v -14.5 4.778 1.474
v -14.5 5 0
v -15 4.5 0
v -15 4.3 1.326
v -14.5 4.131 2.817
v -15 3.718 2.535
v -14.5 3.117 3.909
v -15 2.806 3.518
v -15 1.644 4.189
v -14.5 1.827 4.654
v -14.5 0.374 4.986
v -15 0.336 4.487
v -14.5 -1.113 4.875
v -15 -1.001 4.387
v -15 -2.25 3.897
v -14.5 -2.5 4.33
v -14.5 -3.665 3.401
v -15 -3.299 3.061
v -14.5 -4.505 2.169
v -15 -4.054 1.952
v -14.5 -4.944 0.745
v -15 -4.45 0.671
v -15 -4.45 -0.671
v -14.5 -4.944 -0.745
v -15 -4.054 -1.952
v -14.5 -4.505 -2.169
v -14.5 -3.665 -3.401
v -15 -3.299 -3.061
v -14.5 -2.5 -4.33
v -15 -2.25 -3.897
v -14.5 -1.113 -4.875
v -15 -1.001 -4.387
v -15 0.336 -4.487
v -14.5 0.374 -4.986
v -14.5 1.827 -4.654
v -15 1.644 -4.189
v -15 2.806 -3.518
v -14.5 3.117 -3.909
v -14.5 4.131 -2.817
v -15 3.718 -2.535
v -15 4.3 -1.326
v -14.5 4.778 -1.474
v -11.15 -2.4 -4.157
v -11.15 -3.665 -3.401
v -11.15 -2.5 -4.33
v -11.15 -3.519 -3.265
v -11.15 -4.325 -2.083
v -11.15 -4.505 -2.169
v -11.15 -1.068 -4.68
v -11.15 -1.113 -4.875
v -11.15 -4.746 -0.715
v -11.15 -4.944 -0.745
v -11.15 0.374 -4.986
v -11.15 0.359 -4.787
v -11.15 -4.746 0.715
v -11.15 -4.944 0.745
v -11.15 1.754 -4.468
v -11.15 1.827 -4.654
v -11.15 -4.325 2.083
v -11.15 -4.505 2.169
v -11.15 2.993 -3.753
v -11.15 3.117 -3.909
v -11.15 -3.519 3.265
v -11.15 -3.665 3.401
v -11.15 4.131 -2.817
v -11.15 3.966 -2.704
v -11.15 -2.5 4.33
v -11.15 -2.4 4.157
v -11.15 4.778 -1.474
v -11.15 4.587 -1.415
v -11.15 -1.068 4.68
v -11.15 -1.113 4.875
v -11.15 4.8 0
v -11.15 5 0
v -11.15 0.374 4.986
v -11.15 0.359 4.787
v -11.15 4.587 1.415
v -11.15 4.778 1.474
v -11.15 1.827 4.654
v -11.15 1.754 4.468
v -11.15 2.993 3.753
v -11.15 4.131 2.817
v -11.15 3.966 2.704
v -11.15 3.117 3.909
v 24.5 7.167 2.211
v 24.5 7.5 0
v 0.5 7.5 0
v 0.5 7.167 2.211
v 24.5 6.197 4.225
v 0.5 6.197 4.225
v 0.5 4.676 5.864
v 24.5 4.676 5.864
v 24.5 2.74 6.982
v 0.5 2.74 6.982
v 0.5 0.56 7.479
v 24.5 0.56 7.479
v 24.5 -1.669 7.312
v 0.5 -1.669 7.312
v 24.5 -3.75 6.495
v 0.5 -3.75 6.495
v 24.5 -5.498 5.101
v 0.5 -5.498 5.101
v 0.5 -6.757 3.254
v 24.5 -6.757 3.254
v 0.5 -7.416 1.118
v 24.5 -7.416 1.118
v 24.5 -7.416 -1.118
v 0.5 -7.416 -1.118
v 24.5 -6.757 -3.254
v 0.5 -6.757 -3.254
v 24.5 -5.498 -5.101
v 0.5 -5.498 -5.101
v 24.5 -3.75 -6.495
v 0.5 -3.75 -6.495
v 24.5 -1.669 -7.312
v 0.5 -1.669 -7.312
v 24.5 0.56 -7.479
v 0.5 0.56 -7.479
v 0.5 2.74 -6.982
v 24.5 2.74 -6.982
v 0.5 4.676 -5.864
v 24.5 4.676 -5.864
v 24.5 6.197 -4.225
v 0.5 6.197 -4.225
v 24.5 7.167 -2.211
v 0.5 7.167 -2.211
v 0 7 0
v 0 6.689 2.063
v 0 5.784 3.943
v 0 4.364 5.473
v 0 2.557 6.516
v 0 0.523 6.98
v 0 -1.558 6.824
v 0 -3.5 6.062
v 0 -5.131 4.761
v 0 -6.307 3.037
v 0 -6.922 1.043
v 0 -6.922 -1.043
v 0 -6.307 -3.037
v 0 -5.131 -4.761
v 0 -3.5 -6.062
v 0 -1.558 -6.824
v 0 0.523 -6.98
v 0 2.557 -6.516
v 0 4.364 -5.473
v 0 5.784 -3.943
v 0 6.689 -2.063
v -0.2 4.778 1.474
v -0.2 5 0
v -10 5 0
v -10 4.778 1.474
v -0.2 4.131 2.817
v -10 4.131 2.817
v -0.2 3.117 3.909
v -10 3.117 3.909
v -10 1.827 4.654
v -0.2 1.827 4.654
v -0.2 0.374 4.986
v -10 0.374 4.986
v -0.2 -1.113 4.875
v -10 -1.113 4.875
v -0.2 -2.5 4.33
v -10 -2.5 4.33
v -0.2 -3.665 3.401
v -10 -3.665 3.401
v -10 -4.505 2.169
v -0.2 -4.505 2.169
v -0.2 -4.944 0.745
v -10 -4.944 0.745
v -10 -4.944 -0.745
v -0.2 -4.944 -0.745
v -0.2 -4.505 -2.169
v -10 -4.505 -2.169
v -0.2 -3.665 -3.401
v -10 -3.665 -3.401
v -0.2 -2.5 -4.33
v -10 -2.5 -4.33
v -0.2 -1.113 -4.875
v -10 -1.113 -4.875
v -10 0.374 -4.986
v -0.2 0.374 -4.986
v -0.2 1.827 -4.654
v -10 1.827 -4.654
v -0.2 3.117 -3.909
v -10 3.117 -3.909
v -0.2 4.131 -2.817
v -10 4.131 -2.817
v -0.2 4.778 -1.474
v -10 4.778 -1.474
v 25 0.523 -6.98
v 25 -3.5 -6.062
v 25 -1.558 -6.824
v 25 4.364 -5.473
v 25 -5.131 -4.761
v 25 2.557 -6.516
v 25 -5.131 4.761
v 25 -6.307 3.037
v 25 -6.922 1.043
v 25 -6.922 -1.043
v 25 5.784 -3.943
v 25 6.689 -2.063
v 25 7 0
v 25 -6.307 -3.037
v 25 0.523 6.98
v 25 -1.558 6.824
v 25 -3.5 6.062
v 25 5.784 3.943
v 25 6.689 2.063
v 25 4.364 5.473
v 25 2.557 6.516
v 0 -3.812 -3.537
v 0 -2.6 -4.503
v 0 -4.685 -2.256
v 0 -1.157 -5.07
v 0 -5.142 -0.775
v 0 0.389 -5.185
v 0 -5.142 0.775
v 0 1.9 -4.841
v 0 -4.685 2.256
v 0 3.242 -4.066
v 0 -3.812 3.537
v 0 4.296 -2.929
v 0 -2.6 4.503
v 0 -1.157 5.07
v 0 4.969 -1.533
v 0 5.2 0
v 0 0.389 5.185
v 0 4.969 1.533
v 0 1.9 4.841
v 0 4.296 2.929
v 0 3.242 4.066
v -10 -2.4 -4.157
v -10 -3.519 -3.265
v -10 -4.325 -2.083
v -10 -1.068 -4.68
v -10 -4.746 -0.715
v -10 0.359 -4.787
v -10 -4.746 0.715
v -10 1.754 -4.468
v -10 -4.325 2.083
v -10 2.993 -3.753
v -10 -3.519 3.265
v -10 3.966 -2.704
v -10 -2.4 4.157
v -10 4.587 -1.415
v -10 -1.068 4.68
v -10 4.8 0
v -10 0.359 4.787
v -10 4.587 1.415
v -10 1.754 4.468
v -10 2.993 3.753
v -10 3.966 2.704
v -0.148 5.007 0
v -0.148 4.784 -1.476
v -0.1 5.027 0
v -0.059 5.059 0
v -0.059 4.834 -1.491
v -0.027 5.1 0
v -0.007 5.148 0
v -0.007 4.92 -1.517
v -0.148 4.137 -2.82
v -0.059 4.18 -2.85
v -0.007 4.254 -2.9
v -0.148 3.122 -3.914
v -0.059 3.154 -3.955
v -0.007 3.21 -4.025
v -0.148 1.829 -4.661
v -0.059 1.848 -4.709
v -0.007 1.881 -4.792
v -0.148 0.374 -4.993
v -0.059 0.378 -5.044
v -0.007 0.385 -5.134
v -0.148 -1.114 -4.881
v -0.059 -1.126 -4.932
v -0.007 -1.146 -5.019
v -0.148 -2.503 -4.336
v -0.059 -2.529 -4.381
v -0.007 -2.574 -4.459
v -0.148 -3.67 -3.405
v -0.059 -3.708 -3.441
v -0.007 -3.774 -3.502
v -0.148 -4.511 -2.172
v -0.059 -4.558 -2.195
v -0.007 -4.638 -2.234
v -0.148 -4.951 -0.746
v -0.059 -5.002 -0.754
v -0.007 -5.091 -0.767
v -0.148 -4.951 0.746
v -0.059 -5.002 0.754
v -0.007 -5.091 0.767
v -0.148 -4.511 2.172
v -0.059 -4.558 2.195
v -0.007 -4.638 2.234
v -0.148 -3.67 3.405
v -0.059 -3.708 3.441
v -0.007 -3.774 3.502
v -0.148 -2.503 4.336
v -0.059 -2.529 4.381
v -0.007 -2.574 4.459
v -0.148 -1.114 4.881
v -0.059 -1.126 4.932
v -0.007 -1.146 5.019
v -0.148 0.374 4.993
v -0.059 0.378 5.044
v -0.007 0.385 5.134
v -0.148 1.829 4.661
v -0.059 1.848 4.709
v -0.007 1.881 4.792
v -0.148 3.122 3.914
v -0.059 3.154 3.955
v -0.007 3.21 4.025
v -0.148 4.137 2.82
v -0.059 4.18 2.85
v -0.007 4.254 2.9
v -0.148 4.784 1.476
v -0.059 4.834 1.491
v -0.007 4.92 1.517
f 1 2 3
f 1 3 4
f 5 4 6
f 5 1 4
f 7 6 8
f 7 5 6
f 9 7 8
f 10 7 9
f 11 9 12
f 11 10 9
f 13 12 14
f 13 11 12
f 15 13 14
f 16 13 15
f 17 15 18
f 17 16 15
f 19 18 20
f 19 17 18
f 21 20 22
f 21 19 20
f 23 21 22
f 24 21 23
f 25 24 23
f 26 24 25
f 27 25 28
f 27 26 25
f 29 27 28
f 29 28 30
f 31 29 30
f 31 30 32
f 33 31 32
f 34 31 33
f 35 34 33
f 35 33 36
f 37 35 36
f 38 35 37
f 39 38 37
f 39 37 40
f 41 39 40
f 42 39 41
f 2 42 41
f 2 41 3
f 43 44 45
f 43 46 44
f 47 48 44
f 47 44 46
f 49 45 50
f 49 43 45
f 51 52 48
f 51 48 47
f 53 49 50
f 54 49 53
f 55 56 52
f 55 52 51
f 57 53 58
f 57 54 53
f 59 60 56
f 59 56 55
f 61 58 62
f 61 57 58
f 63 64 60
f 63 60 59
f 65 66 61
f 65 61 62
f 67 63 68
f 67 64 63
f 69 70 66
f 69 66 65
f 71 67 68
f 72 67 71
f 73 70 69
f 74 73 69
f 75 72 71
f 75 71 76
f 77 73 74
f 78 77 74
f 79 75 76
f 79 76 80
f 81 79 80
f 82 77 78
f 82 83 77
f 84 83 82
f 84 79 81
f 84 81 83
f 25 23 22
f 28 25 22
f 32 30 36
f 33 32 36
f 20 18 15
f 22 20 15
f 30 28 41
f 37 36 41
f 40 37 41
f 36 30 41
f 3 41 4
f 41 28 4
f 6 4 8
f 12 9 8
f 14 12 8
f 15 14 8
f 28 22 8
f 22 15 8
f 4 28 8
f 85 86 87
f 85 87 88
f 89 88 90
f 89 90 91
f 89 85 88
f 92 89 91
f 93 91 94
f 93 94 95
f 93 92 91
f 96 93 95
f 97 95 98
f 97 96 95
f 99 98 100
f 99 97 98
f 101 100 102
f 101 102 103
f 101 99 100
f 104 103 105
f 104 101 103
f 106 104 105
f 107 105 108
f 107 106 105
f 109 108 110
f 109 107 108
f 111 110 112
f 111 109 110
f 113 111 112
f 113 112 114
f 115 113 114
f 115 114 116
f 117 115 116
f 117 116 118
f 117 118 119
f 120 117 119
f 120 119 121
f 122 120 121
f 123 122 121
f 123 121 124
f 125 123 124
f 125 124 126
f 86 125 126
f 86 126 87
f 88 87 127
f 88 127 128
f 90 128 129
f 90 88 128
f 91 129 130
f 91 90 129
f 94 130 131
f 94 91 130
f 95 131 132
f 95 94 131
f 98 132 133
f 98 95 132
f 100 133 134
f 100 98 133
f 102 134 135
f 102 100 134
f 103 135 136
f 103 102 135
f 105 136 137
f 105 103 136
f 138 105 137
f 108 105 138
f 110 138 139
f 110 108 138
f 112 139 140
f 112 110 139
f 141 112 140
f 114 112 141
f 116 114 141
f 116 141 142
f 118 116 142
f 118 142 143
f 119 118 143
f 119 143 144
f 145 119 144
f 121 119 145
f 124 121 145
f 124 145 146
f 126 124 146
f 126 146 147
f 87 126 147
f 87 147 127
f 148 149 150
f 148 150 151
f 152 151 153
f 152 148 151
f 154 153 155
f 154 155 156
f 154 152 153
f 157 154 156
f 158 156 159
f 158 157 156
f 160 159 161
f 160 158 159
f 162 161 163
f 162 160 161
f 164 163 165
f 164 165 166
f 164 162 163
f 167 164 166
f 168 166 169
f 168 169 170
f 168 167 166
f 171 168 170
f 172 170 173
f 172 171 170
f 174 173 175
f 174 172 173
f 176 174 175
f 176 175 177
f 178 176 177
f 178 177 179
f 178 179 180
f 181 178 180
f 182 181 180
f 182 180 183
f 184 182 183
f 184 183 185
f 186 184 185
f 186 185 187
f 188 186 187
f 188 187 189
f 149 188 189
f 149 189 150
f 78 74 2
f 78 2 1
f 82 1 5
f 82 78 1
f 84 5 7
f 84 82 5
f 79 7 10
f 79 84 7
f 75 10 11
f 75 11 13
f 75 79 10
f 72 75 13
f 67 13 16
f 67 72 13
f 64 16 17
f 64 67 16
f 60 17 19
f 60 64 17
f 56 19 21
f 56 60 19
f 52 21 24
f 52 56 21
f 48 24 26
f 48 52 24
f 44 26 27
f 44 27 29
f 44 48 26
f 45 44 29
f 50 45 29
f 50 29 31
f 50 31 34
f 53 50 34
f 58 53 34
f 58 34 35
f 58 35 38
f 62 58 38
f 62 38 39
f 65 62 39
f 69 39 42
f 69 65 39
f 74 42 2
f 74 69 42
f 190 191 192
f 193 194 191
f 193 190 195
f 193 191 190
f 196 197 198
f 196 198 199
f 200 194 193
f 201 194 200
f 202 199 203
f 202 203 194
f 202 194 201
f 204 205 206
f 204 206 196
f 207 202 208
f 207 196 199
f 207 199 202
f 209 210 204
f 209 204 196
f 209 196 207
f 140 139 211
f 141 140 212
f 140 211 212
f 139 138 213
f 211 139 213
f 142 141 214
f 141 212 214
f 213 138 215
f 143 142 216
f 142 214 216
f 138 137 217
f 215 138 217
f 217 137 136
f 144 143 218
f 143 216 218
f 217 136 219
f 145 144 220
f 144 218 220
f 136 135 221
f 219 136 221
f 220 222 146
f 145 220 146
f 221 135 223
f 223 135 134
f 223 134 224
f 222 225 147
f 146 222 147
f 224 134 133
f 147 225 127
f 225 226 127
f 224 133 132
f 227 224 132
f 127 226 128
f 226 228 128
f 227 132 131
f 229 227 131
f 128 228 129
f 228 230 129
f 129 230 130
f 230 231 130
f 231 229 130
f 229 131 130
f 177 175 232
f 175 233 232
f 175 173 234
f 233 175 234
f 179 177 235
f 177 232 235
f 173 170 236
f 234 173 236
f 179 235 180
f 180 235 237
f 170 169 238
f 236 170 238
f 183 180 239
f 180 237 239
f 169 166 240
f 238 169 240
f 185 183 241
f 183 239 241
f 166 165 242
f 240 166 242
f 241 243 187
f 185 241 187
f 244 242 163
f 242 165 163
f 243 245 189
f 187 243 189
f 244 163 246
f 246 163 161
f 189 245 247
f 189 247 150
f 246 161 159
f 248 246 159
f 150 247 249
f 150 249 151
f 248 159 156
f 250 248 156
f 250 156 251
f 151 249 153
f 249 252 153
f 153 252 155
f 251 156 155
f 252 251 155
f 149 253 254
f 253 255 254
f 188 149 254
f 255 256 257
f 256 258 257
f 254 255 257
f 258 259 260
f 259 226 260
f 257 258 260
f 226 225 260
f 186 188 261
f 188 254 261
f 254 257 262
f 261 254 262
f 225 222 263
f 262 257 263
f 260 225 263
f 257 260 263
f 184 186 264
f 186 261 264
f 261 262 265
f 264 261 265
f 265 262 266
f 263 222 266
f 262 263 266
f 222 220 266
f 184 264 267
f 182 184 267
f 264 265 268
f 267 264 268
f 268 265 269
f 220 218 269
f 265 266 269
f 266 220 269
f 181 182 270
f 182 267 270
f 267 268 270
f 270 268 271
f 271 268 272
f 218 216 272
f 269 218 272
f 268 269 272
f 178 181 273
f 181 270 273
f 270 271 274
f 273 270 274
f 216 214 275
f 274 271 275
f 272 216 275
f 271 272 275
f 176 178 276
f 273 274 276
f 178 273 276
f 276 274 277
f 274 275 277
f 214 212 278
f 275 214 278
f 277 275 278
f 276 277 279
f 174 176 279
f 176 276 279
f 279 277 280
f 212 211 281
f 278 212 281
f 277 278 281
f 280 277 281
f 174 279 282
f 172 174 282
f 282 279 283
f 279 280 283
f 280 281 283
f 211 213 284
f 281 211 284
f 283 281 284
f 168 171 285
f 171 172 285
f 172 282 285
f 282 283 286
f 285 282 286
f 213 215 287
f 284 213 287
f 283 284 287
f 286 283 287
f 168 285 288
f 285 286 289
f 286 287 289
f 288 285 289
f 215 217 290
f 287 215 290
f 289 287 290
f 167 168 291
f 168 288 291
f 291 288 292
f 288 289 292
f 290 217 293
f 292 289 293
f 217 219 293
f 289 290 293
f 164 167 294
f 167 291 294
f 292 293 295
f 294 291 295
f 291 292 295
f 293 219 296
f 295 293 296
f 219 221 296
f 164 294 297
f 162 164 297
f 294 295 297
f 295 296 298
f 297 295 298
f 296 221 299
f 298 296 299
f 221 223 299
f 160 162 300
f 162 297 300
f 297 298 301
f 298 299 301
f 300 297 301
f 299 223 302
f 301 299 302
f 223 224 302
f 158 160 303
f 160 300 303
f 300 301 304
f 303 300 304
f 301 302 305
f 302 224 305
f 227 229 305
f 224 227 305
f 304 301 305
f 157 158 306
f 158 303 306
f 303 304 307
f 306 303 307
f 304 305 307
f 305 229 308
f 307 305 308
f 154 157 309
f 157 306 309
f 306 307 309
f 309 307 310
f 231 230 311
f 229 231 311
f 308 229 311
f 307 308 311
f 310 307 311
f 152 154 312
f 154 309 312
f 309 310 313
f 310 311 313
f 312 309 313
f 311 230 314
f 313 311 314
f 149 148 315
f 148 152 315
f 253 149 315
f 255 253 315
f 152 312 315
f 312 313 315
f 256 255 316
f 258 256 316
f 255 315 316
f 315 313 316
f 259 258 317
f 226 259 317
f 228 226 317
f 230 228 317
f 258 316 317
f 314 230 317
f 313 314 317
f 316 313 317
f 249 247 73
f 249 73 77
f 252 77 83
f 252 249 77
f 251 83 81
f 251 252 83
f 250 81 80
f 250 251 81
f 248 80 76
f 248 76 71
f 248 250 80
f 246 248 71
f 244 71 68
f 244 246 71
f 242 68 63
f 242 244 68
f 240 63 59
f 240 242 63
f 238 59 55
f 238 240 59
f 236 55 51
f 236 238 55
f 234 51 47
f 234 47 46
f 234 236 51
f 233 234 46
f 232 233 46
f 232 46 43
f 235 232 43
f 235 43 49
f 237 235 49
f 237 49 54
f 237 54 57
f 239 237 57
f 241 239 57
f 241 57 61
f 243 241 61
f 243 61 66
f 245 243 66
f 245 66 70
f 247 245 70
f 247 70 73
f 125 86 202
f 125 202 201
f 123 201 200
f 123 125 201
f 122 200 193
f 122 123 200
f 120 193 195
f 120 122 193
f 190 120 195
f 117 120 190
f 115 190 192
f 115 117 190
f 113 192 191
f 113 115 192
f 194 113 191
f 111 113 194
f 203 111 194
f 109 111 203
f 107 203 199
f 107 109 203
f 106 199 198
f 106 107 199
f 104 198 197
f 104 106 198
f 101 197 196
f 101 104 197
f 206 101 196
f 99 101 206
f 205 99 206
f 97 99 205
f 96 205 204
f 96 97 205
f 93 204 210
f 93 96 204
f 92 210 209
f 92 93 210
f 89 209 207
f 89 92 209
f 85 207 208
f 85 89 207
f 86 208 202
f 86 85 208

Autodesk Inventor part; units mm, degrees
ref_plane "YZ Plane" through (0, 0, 0) normal (1, 0, 0) x (0, 1, 0)
ref_plane "XZ Plane" through (0, 0, 0) normal (0, 1, 0) x (-1, 0, 0)
ref_plane "XY Plane" through (0, 0, 0) normal (0, 0, 1) x (1, 0, 0)
sketch "Sketch_1" plane through (0, 0, 0) normal (0, 0, 1) x (1, 0, 0)
  line L0 (25, 0) -> (-15, 0)
  line L1 (-15, 0) -> (-15, 4.5)
  line L2 (-15, 4.5) -> (-14.5, 5)
  line L3 (-14.5, 5) -> (-0.2, 5)
  arc A0 (-0.2, 5) -> (0, 5.2) centre (-0.2, 5.2) ccw
  line L4 (0, 5.2) -> (0, 7)
  line L5 (0, 7) -> (0.5, 7.5)
  line L6 (0.5, 7.5) -> (24.5, 7.5)
  line L7 (24.5, 7.5) -> (25, 7)
  line L8 (25, 7) -> (25, 0)
  line L9 (25, 0) -> (-15, 0)
revolve "Revolution1" add sketch "Sketch_1" angle 360 about axis through (25, 0, 0) along (1, 0, 0)
sketch "Sketch_40" plane through (0, 0, 0) normal (0, 0, 1) x (1, 0, 0)
  line L0 (1000, 0) -> (-1000, 0)
  line L1 (-11.15, 4.8) -> (-10, 4.8)
  line L2 (-10, 4.8) -> (-10, 20)
  line L3 (-10, 20) -> (-11.15, 20)
  line L4 (-11.15, 20) -> (-11.15, 4.8)
revolve "Revolution2" cut sketch "Sketch_40" angle 360 about axis through (1000, 0, 0) along (1, 0, 0)
properties part number "SFRX15-25-F15-B5-P10"
